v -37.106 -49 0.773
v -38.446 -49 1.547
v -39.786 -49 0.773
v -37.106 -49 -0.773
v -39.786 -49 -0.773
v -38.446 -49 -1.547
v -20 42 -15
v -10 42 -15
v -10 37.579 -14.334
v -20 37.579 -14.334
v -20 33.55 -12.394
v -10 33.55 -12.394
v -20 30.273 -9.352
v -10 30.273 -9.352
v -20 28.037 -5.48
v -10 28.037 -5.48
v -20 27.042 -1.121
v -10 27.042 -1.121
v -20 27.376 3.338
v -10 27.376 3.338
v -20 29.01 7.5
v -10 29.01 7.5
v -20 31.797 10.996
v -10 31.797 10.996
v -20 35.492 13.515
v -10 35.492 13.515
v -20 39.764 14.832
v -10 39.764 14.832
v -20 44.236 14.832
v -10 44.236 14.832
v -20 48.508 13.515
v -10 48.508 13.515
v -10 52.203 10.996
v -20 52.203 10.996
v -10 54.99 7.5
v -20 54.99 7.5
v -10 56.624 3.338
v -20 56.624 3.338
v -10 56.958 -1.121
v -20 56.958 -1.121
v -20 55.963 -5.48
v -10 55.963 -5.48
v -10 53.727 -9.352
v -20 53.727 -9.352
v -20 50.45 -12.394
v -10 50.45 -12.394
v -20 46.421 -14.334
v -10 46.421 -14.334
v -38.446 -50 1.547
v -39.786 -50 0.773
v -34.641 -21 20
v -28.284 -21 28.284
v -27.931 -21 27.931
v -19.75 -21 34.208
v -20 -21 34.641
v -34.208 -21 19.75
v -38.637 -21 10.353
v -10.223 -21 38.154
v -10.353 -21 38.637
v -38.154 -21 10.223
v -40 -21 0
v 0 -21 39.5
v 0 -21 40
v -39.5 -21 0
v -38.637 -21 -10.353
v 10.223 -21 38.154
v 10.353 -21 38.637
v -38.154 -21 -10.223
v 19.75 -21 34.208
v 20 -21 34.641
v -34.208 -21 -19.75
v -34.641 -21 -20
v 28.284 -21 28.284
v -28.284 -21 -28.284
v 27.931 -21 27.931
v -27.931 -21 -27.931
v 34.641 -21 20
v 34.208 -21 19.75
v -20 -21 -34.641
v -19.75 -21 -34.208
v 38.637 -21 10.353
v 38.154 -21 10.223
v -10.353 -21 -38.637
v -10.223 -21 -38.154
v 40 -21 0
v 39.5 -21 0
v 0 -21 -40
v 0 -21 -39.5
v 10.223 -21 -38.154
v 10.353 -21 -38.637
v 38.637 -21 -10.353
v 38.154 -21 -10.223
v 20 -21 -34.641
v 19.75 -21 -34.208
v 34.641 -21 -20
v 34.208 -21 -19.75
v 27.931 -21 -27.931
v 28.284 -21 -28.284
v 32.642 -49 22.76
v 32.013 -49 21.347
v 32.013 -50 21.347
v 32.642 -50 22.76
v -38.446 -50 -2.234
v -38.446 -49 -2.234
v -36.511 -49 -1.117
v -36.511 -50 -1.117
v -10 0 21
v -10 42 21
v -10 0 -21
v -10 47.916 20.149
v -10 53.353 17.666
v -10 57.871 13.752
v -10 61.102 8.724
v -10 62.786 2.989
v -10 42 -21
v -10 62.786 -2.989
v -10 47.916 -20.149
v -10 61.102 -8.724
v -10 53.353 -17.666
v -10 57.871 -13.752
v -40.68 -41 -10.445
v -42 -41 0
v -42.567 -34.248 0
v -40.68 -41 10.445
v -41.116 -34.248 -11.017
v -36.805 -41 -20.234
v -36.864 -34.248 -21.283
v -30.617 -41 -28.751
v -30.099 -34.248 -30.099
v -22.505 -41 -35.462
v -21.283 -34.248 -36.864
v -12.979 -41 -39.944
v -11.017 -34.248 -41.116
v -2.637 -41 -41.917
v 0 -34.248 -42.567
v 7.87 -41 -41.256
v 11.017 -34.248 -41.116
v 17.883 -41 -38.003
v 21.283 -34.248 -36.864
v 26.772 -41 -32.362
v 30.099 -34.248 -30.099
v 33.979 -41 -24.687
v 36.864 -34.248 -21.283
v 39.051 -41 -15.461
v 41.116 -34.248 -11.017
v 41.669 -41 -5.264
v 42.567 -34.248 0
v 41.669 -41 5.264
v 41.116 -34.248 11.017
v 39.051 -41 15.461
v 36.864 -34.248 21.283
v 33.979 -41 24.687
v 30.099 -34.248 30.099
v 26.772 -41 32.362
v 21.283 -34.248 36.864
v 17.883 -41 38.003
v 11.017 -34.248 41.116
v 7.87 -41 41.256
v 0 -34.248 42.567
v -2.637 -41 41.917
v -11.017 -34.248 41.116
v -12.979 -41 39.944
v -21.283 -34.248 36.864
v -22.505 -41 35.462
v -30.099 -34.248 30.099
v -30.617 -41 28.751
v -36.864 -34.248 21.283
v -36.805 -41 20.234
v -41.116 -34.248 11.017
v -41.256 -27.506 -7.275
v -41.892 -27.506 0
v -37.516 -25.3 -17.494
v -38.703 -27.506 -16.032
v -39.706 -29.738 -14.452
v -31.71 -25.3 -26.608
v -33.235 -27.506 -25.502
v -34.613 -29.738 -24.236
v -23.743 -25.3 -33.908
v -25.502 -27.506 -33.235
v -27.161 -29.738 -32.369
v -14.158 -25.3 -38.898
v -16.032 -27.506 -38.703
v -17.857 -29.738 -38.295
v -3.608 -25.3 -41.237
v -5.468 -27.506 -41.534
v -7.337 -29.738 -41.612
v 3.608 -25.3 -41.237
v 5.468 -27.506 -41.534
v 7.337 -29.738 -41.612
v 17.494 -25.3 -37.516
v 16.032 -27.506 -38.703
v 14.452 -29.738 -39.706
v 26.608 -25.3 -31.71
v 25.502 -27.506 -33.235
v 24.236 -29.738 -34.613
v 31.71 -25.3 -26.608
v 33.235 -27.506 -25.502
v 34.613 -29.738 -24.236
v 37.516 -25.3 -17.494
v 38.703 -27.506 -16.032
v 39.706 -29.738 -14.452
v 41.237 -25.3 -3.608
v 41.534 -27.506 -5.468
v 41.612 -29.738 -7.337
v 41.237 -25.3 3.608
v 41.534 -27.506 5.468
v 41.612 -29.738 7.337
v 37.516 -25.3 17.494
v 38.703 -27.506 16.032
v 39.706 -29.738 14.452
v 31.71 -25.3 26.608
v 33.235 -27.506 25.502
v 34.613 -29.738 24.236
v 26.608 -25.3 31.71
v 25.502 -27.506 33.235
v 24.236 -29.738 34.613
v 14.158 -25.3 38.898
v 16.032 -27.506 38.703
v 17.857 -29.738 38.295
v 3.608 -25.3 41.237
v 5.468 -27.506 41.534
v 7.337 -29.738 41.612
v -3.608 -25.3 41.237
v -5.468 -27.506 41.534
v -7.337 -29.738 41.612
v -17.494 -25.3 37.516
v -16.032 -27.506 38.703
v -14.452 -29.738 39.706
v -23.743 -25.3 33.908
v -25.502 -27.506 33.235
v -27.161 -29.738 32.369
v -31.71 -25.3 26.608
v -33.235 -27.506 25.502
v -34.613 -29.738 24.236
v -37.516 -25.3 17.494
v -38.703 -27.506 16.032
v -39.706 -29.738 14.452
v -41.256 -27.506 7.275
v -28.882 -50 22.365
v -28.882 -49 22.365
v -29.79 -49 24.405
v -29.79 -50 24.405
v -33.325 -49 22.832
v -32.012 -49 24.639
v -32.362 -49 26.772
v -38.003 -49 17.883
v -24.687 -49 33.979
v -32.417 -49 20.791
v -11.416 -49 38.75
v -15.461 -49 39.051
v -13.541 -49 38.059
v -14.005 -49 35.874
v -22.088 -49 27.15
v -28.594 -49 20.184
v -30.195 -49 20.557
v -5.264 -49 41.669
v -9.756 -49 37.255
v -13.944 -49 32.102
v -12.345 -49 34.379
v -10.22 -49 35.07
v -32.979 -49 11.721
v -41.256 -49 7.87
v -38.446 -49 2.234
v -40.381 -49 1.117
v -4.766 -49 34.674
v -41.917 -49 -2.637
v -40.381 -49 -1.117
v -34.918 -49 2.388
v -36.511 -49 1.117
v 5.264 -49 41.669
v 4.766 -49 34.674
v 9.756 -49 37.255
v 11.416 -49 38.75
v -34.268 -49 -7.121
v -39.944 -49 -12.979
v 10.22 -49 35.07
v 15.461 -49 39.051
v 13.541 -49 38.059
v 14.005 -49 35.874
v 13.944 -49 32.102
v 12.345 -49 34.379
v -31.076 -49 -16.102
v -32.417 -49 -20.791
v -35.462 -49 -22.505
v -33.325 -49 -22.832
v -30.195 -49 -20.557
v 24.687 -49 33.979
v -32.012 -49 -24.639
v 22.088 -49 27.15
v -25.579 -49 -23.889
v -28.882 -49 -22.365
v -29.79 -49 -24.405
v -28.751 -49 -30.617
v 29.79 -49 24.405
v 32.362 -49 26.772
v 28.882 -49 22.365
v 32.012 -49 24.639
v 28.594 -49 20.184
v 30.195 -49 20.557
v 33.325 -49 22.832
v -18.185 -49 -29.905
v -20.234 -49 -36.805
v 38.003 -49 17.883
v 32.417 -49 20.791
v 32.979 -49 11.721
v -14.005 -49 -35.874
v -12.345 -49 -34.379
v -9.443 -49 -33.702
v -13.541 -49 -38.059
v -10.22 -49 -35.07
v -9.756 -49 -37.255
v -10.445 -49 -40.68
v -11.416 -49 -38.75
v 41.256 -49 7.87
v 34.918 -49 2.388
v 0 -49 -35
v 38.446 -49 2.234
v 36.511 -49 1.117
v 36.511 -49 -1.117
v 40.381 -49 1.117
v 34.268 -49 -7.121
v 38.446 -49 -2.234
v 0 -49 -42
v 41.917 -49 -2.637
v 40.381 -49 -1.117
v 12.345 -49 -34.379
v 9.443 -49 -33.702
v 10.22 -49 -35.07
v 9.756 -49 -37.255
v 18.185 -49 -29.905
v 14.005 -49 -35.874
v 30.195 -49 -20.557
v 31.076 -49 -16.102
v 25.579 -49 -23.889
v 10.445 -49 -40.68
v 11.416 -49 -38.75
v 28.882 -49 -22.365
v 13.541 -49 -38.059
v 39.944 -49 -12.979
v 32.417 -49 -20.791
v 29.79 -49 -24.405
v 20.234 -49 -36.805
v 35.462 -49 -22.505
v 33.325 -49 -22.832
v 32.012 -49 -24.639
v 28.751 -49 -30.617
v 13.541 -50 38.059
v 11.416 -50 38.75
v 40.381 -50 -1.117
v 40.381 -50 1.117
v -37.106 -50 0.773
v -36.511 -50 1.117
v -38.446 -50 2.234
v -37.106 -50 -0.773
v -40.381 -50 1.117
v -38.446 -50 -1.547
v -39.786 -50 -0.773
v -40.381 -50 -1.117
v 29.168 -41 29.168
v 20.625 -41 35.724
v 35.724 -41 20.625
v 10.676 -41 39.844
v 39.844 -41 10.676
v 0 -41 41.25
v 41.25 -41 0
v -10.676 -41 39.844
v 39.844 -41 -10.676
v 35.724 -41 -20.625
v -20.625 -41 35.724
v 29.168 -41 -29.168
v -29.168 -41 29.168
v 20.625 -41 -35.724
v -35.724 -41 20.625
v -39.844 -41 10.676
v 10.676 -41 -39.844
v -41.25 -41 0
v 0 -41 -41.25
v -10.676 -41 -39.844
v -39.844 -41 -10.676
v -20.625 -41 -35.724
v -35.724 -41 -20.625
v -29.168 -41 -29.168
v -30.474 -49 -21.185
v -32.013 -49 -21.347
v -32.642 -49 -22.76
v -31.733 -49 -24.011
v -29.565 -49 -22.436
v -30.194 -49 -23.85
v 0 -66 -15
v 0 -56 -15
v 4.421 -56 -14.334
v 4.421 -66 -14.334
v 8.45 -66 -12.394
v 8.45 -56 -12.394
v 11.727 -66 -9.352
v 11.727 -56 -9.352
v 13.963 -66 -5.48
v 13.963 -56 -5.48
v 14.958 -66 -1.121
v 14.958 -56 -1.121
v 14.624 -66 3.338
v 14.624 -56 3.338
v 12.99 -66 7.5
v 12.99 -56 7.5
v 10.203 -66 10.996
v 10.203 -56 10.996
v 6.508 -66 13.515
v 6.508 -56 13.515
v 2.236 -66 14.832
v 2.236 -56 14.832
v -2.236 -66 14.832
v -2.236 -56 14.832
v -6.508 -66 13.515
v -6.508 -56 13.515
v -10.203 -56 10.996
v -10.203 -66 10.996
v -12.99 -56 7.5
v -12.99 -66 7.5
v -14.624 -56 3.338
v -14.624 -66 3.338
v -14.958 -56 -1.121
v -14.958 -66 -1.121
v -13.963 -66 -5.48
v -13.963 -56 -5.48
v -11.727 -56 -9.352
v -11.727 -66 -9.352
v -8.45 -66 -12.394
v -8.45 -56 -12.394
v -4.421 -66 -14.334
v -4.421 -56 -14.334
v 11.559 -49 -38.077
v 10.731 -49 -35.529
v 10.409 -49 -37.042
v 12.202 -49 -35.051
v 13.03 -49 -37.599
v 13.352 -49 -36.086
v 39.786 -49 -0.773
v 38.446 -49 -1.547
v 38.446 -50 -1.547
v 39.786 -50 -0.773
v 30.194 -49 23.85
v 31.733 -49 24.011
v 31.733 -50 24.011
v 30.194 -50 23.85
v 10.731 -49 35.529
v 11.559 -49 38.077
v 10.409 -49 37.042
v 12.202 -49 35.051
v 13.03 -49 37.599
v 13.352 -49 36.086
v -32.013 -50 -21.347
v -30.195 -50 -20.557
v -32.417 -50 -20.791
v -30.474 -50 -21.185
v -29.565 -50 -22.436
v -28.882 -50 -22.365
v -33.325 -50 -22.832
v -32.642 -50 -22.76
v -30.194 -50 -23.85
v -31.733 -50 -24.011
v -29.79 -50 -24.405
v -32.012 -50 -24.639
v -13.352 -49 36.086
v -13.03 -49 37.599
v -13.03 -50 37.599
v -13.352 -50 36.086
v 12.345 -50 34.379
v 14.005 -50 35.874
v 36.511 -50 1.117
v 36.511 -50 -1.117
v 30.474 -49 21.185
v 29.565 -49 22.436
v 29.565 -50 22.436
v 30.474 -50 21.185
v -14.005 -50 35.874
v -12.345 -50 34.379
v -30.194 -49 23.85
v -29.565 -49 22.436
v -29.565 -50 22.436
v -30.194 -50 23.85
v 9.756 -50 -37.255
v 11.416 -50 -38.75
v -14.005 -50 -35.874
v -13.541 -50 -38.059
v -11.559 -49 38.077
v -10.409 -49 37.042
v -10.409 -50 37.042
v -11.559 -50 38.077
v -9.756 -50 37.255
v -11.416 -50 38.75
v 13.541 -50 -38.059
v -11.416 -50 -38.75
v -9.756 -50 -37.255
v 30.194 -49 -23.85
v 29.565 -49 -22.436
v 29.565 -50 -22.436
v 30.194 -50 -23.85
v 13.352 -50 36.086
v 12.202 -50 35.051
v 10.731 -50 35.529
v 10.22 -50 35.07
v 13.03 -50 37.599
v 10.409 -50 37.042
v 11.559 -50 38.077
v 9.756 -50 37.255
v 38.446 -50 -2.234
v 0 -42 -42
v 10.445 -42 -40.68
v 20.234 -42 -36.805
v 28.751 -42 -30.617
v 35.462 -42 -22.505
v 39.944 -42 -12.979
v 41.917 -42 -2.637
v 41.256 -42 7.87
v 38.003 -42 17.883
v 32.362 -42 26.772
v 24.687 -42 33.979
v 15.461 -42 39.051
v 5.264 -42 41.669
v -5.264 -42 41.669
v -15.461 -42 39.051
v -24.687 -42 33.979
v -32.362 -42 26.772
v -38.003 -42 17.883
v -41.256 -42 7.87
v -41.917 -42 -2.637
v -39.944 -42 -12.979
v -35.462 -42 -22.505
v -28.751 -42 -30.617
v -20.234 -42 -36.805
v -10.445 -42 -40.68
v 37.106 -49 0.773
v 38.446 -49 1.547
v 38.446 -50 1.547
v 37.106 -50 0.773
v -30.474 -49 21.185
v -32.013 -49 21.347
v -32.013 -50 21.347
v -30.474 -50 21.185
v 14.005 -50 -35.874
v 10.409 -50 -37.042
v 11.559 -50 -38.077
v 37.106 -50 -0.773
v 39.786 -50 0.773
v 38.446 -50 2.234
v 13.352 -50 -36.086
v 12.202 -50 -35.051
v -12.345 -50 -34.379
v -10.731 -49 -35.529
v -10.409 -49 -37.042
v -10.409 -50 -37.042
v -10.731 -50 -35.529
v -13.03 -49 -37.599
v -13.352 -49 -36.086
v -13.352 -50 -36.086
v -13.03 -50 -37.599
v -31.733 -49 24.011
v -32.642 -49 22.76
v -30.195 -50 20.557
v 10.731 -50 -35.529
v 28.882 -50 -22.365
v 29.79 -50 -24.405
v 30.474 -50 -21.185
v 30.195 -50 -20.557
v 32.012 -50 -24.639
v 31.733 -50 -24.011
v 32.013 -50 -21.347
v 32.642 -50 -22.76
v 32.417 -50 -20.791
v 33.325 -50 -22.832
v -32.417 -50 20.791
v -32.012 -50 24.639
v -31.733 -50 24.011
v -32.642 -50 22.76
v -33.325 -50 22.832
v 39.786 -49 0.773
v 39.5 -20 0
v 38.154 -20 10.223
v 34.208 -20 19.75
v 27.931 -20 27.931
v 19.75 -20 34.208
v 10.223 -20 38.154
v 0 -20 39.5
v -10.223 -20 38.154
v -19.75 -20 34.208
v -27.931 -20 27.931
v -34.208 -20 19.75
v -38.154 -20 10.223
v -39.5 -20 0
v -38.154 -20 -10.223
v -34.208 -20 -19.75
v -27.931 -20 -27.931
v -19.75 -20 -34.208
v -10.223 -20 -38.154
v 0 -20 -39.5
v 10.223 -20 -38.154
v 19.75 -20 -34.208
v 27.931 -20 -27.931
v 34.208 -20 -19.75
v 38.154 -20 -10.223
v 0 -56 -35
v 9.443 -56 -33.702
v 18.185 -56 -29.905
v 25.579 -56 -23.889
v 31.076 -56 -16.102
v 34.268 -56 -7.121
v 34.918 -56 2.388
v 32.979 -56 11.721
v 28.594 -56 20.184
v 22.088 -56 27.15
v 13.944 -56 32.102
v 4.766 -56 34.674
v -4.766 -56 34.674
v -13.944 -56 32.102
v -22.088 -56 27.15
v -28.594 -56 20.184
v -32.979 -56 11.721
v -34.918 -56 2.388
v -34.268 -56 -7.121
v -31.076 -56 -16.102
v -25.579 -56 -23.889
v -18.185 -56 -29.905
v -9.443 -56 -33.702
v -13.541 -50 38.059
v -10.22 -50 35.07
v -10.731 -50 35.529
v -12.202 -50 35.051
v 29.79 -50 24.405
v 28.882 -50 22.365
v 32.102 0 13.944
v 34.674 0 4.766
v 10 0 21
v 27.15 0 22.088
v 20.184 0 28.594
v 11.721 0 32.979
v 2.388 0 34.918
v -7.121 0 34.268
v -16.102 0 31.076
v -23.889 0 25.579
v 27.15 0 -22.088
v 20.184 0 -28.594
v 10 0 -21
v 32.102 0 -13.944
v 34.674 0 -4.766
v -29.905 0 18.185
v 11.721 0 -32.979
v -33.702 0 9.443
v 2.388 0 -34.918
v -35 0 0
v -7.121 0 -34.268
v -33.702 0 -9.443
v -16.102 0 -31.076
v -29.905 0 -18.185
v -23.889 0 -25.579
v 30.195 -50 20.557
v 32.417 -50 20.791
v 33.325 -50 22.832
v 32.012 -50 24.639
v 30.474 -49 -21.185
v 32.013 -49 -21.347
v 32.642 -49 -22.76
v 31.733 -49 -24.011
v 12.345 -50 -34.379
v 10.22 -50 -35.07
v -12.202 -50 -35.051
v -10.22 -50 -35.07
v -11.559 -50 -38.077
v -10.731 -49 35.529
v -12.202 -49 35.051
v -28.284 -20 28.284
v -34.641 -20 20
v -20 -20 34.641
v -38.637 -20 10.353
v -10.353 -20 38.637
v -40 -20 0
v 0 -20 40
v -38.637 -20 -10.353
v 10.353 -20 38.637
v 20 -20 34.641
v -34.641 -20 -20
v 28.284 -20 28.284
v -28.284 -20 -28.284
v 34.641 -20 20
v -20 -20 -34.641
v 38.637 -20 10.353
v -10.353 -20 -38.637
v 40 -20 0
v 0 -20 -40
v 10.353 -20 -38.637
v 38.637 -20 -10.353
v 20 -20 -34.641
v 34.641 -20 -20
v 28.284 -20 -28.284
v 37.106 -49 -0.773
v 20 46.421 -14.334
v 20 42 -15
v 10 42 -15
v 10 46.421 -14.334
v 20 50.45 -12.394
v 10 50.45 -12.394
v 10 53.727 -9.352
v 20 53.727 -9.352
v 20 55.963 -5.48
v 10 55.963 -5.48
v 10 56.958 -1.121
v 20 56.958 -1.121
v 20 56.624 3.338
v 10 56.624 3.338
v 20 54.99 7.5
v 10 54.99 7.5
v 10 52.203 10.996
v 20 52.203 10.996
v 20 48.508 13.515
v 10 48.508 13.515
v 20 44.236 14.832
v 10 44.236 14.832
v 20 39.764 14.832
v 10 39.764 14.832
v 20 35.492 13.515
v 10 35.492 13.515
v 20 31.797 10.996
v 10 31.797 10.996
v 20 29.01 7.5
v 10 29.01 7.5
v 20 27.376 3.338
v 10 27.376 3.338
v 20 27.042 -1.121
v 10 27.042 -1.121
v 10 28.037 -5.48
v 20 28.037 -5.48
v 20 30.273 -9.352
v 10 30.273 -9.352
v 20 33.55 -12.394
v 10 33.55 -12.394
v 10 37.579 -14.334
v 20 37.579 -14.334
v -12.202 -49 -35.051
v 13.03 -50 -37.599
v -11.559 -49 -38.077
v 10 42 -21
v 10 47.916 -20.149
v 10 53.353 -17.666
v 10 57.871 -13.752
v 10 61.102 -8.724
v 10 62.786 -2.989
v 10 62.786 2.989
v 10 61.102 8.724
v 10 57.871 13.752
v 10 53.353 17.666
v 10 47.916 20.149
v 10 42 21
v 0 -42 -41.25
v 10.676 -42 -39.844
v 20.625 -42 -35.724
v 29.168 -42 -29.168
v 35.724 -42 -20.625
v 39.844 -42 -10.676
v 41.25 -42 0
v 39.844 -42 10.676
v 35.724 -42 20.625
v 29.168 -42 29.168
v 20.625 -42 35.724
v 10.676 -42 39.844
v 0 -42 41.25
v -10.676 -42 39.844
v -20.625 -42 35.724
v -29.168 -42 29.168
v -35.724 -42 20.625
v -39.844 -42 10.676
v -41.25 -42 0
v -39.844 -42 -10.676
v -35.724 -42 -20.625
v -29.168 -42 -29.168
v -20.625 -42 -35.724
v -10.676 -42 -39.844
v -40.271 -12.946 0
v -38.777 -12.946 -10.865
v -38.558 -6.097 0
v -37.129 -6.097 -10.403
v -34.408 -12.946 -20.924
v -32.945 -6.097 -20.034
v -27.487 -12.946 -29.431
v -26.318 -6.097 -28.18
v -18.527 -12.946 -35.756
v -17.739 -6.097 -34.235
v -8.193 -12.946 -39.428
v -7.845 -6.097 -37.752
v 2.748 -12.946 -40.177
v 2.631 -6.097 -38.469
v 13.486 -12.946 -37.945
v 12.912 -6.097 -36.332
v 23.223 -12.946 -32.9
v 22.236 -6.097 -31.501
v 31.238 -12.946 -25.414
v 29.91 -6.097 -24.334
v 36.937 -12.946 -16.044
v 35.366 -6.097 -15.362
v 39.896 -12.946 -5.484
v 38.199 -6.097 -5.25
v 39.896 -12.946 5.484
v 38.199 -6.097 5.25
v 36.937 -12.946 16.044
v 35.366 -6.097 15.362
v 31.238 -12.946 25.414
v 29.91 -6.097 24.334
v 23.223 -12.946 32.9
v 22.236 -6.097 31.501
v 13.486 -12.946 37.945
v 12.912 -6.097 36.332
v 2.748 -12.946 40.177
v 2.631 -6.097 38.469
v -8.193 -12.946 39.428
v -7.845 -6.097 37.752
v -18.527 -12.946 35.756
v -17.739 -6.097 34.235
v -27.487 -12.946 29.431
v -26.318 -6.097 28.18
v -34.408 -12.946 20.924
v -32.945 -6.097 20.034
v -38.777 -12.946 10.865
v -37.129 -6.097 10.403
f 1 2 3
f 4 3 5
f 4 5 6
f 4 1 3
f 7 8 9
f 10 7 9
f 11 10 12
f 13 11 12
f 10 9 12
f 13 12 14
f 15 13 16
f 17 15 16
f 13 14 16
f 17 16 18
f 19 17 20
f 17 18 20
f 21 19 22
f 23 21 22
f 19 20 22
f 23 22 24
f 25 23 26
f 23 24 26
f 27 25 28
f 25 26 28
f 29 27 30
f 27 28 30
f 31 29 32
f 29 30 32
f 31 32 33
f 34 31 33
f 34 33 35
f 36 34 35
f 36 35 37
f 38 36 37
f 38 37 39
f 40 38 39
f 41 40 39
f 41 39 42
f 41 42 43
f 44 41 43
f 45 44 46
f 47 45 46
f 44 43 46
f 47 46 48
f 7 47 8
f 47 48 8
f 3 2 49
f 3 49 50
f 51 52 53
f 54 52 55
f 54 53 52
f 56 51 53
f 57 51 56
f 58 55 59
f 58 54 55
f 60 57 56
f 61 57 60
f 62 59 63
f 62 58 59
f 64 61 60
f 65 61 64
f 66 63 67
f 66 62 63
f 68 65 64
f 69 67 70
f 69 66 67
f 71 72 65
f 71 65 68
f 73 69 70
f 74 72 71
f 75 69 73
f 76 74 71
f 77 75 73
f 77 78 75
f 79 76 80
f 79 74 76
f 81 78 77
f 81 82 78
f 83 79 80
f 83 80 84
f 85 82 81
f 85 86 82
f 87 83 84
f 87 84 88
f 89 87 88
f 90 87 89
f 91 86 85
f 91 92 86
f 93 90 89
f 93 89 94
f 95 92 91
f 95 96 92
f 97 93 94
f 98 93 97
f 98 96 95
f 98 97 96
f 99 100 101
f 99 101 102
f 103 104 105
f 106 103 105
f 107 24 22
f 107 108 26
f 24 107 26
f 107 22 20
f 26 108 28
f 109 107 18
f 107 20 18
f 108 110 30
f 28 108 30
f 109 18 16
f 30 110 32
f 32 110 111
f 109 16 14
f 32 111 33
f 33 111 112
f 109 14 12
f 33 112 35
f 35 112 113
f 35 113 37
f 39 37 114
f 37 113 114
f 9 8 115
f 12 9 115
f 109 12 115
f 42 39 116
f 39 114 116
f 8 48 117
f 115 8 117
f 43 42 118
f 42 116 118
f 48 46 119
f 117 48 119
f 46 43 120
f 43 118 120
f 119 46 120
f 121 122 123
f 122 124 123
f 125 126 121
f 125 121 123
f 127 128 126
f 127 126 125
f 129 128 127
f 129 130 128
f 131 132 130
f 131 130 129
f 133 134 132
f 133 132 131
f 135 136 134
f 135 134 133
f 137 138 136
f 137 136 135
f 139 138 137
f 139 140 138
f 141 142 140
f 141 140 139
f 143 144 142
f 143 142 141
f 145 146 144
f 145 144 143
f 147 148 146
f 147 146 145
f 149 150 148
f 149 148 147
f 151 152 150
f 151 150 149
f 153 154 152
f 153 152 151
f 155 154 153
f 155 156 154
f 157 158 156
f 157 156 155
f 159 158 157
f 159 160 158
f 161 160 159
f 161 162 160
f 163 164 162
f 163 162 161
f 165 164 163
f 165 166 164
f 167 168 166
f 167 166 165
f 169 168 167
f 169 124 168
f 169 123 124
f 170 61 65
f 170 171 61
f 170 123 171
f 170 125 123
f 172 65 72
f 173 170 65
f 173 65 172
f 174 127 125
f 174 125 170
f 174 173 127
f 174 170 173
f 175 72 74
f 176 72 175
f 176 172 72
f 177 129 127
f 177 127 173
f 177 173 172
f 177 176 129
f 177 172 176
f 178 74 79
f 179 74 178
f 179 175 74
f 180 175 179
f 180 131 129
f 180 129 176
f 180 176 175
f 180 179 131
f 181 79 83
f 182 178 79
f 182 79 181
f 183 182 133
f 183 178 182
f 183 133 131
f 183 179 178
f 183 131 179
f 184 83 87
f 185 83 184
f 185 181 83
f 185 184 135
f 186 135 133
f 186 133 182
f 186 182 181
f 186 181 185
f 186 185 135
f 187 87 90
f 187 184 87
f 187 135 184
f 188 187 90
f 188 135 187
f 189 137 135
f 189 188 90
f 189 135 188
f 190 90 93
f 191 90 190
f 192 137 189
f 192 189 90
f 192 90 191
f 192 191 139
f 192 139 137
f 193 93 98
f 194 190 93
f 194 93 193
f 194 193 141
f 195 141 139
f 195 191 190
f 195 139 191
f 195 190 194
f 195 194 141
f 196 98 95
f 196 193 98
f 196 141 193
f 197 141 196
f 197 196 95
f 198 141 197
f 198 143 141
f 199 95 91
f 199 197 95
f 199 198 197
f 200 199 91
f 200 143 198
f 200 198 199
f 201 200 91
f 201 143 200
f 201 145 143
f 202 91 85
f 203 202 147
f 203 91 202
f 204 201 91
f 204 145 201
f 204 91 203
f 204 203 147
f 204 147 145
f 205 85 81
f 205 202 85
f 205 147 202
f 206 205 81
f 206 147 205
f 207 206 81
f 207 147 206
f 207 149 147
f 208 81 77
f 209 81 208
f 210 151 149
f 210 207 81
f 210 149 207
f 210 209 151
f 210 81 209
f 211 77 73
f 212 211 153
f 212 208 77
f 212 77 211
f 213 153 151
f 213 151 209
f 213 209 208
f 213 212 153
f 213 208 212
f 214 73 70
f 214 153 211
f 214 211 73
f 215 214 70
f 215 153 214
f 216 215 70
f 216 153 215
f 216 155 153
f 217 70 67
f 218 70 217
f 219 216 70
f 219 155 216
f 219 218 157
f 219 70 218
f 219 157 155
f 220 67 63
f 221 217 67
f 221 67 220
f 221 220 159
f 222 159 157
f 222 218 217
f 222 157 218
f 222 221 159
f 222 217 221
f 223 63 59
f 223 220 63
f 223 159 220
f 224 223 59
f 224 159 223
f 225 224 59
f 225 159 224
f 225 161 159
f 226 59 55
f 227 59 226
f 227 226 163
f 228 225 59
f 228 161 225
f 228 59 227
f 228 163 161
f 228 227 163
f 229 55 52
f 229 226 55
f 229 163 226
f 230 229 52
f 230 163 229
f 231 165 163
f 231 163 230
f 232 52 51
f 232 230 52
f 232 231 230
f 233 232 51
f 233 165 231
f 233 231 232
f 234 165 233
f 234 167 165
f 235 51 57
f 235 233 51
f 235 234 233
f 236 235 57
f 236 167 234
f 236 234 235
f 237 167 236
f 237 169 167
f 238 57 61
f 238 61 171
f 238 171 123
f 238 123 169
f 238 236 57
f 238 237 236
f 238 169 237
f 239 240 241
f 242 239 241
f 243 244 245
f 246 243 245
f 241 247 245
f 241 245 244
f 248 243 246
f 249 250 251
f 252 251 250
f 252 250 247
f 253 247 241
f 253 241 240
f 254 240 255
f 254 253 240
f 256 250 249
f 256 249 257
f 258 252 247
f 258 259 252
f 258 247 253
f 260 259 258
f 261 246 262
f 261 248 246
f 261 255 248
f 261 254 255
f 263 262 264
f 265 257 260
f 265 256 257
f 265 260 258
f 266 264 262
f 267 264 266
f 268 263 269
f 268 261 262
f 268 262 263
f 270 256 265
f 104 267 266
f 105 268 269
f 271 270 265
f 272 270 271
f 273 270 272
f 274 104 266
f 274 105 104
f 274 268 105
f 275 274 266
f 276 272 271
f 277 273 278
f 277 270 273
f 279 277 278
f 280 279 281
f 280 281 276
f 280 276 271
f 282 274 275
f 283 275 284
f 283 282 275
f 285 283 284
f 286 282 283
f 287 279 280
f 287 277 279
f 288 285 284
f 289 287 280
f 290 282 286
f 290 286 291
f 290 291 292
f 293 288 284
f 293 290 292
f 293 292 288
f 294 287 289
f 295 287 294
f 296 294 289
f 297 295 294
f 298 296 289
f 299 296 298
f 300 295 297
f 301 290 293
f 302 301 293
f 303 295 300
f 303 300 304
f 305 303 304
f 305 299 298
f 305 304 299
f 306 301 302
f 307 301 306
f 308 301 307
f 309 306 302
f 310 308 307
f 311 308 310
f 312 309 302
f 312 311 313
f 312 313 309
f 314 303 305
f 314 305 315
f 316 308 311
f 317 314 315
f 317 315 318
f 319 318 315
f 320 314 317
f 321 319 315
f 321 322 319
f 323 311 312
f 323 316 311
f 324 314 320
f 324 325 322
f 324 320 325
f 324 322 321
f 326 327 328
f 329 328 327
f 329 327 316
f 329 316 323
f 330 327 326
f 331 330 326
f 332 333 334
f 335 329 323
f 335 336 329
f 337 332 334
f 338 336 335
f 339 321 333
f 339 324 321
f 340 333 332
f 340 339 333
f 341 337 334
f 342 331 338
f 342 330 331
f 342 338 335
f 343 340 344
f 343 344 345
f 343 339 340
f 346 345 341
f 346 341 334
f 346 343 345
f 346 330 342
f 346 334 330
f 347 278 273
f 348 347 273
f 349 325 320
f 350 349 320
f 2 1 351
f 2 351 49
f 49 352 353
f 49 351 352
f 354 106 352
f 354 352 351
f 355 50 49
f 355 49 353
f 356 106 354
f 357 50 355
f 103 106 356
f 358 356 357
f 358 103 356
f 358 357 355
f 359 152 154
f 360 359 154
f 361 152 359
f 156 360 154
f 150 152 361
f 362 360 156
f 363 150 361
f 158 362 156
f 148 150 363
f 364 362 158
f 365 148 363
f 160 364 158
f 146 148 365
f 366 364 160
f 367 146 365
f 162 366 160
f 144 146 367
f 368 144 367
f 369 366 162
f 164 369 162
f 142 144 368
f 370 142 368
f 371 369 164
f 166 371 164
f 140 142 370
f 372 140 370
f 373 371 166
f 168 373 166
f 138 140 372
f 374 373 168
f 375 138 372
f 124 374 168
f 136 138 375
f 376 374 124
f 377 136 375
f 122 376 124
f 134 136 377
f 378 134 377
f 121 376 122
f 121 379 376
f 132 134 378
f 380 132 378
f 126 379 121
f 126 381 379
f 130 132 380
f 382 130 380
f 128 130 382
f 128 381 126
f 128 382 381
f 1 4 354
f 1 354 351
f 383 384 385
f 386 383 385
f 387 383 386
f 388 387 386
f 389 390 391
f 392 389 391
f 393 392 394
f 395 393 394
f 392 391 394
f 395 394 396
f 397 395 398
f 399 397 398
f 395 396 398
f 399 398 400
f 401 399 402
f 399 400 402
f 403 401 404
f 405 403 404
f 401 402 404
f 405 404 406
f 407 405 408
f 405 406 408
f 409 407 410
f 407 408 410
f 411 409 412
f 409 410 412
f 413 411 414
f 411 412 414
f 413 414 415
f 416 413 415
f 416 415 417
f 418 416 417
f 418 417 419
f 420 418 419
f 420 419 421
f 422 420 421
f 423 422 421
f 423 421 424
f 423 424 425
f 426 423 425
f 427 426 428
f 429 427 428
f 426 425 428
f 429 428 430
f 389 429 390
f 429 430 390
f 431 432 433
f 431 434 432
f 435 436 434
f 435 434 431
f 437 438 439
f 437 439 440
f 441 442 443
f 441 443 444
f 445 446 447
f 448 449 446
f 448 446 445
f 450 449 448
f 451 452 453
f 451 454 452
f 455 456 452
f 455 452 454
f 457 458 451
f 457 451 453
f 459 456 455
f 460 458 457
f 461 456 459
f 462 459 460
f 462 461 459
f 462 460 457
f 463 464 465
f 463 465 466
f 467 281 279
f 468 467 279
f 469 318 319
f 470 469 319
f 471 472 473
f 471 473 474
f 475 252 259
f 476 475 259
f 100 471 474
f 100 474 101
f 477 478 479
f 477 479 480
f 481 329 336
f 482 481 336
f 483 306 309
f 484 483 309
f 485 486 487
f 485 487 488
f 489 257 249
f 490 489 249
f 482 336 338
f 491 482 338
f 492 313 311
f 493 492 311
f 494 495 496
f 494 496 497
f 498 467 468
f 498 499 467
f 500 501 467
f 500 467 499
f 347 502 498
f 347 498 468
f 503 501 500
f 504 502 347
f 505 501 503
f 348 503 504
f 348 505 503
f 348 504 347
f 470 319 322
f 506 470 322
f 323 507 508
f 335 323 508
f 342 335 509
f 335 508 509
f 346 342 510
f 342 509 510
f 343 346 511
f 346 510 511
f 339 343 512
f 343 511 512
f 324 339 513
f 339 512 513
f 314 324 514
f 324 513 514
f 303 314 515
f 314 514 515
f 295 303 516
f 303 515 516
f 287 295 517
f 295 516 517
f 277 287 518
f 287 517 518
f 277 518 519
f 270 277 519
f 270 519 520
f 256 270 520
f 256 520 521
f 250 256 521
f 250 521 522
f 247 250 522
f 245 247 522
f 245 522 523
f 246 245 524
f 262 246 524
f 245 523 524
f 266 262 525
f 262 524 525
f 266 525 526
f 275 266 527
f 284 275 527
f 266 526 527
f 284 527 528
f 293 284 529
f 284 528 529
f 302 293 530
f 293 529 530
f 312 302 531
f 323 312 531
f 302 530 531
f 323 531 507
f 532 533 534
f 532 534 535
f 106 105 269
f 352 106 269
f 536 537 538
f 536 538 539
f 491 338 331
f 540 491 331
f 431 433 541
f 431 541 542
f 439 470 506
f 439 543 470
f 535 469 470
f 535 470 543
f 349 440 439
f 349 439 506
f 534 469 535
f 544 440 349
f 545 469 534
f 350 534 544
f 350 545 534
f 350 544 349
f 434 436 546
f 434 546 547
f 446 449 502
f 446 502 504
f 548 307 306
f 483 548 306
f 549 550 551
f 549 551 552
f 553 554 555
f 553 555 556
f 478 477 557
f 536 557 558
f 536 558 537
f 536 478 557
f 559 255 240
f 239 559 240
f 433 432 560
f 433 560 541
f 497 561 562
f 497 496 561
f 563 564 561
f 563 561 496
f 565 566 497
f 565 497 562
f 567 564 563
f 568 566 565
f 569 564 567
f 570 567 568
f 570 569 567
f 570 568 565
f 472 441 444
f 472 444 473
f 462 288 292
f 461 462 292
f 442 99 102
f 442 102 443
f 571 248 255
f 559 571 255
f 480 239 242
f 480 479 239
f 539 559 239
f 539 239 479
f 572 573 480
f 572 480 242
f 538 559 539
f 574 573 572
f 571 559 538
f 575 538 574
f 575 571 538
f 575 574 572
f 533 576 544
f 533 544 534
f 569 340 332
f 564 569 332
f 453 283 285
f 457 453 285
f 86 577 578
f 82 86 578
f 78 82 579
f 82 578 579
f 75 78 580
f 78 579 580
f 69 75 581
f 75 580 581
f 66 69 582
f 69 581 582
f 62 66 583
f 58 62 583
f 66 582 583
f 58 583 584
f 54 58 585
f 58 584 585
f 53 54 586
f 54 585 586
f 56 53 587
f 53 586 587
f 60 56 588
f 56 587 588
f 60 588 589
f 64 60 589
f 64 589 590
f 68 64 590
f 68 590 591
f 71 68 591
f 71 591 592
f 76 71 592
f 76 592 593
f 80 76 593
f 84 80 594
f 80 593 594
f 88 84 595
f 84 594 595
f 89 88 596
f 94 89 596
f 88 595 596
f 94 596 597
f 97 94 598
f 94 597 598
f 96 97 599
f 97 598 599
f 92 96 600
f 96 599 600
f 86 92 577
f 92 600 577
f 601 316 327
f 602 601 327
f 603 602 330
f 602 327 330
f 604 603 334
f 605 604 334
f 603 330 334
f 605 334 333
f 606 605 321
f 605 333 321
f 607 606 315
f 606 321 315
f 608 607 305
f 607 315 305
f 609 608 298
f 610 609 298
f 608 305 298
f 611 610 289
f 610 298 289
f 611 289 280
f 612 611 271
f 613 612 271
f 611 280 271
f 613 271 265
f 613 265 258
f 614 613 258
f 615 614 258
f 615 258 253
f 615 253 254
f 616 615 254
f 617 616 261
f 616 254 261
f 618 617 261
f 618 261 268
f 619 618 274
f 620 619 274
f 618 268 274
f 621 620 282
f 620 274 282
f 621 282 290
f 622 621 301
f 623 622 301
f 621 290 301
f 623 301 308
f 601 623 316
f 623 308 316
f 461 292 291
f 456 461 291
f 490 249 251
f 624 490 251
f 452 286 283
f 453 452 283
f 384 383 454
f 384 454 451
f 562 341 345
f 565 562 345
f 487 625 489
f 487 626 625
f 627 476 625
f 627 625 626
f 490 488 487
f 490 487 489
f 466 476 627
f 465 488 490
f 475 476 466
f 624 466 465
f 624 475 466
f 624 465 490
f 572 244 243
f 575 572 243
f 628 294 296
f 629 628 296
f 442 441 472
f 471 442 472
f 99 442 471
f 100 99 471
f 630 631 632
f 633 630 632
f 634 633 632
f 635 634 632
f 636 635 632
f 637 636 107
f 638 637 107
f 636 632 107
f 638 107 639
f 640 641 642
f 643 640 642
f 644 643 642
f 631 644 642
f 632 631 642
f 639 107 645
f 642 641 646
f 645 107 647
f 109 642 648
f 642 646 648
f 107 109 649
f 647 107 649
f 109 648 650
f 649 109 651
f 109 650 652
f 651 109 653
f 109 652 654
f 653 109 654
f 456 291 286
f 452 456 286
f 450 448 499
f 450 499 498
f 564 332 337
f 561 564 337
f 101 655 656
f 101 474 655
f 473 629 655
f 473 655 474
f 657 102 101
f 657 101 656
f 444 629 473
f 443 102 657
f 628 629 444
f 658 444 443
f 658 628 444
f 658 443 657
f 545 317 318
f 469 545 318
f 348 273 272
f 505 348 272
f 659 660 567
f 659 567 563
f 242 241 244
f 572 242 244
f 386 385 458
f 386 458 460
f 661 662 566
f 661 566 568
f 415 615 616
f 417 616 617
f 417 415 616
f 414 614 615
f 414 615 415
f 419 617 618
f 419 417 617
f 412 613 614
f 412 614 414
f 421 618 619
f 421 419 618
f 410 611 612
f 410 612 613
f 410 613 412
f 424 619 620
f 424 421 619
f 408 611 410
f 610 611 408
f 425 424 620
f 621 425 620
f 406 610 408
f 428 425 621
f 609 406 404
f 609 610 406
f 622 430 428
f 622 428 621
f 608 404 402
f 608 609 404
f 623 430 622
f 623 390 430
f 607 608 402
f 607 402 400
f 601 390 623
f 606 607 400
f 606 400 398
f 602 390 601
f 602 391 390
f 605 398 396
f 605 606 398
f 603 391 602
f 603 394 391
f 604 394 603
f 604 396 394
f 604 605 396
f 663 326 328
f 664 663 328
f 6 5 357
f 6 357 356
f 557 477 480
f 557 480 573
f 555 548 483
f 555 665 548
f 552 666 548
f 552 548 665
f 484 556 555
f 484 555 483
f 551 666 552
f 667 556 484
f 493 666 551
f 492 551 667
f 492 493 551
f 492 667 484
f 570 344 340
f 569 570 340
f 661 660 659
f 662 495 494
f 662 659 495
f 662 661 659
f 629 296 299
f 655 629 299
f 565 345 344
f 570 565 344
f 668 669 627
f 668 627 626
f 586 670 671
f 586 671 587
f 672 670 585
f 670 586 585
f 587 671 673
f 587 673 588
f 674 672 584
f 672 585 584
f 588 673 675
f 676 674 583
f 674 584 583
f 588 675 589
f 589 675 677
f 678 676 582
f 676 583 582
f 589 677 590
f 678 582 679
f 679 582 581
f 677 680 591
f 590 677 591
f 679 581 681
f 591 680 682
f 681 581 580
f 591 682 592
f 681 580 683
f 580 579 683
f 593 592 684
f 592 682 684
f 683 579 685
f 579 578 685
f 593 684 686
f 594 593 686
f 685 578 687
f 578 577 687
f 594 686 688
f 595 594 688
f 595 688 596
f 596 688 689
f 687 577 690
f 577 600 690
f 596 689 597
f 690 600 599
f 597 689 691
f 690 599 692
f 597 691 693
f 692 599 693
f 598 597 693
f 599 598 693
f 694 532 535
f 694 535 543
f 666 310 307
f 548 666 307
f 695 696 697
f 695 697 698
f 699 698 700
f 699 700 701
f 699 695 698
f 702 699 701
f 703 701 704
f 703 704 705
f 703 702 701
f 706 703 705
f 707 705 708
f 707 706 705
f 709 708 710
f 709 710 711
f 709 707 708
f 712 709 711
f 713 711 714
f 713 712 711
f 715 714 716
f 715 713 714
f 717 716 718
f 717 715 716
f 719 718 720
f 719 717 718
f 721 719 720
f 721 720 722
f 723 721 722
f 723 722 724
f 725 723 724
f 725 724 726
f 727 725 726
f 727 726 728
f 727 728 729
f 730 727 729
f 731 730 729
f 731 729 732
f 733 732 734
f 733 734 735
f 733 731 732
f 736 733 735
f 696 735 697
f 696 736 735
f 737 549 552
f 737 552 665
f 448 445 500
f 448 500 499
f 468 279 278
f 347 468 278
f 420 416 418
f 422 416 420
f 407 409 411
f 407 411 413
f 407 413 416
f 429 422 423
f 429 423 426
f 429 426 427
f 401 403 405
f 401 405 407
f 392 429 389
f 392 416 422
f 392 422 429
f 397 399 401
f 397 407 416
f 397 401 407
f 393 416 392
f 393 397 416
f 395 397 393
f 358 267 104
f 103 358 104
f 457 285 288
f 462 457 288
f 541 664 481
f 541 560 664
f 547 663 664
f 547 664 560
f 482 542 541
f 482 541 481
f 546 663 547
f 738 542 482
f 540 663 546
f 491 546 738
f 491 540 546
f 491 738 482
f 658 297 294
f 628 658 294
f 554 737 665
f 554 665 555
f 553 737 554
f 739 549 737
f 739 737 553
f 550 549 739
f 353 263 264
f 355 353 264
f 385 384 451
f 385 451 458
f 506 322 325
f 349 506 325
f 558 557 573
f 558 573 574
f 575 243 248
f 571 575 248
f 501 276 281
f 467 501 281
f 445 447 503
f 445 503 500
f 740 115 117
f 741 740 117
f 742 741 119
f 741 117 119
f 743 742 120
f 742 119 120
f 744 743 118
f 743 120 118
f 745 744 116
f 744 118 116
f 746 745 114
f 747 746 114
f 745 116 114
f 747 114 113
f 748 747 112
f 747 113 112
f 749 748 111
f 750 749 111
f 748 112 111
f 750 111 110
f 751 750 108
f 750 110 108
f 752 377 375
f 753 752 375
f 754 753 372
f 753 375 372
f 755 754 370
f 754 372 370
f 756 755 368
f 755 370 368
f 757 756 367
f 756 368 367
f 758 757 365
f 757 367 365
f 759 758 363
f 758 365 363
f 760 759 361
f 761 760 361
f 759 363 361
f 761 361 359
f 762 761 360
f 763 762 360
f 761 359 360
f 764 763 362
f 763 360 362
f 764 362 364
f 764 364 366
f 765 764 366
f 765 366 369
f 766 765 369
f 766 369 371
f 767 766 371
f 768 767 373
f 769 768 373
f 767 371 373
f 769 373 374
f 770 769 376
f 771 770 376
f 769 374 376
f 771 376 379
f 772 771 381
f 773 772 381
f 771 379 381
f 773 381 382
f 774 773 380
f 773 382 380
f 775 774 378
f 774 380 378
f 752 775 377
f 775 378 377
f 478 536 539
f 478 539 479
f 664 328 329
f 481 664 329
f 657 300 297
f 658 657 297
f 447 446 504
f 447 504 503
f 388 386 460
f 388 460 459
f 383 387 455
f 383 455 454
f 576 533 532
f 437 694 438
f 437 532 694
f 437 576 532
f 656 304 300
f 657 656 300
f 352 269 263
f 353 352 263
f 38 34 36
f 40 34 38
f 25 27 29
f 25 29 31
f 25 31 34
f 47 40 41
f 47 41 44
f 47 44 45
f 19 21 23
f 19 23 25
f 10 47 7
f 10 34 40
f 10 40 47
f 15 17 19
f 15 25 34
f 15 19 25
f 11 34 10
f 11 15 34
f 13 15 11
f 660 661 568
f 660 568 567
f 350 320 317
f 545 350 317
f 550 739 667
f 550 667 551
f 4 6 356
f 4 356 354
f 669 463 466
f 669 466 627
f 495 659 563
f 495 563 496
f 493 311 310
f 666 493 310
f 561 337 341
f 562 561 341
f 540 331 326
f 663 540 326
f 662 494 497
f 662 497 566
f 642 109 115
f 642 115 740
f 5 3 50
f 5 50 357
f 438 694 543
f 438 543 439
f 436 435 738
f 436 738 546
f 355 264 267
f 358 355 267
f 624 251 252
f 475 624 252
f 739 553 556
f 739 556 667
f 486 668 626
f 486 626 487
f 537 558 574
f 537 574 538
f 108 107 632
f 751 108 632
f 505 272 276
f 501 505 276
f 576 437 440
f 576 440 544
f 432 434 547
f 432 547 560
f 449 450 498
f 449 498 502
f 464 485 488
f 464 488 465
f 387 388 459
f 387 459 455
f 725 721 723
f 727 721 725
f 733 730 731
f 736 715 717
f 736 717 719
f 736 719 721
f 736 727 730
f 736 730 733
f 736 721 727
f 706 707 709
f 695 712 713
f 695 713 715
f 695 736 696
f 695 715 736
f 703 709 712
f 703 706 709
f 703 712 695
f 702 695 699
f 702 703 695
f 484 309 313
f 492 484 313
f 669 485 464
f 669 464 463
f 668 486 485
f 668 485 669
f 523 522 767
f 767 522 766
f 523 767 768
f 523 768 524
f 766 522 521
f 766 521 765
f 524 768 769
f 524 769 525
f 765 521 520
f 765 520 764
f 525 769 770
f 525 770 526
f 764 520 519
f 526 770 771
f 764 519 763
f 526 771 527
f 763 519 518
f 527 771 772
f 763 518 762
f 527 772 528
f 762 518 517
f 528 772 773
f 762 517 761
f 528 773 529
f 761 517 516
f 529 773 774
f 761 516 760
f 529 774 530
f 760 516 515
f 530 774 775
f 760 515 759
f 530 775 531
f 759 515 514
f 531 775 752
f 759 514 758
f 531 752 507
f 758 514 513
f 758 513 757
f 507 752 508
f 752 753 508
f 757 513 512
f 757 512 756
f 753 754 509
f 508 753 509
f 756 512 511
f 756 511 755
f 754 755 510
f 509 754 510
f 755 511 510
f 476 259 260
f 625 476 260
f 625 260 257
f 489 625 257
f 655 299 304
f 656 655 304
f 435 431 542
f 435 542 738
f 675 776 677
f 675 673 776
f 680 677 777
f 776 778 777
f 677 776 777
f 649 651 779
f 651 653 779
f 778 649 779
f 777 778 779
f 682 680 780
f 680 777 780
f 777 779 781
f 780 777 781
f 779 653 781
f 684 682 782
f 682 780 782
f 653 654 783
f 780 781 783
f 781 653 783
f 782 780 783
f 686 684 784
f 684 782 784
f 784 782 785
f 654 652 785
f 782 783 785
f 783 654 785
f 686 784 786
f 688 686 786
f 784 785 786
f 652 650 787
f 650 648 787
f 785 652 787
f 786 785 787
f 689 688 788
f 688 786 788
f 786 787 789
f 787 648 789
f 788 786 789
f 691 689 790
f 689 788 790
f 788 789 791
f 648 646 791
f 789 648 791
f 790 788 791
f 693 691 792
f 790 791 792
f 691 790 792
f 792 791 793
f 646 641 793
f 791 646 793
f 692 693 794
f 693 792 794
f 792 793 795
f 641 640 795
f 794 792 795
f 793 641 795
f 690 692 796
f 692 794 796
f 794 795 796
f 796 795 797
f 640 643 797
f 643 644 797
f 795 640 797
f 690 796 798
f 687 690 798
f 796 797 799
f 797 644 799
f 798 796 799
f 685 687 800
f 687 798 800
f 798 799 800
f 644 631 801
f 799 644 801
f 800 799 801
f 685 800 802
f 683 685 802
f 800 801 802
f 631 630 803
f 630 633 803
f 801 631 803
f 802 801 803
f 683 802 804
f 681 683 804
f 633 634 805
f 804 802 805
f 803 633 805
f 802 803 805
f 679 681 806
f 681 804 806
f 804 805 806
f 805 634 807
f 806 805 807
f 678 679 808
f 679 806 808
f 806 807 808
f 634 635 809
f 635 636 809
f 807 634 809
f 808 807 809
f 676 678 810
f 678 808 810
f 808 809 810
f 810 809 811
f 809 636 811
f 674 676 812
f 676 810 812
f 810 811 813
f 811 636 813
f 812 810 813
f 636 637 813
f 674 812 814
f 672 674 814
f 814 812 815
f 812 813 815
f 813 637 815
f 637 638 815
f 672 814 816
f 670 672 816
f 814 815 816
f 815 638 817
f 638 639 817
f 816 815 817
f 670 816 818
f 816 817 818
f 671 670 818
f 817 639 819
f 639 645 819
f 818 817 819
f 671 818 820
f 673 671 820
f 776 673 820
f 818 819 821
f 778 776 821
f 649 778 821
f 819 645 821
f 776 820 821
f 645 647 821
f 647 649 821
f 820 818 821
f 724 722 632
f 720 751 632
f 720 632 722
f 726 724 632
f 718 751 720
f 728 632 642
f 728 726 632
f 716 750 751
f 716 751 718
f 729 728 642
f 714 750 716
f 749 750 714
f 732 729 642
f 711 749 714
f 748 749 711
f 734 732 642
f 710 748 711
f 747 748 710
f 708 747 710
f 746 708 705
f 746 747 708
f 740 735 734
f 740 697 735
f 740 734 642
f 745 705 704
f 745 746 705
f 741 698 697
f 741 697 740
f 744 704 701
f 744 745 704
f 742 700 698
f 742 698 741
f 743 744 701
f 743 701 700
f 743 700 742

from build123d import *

# Parameters (mm, degrees)
SKETCH2_R            = 39.5
BOSS_EXTRUDE1_DEPTH  = 1
SKETCH4_R            = 41.25
BOSS_EXTRUDE2_DEPTH  = 1
SKETCH5_R            = 42
BOSS_EXTRUDE3_DEPTH  = 7
SKETCH6_R            = 35
BOSS_EXTRUDE4_DEPTH  = 7
BOSS_EXTRUDE5_DEPTH  = 1
CIRPATTERN1_COUNT    = 10
SKETCH9_R            = 15
BOSS_EXTRUDE6_DEPTH  = 10
SKETCH10_W           = 20
SKETCH10_H           = 42
BOSS_EXTRUDE7_DEPTH  = 42
BOSS_EXTRUDE8_START  = -20
BOSS_EXTRUDE8_DEPTH  = 20
SKETCH12_R           = 15
BOSS_EXTRUDE9_DEPTH  = 10
BOSS_EXTRUDE10_START = 10
SKETCH13_R           = 15
BOSS_EXTRUDE10_DEPTH = 10


with BuildPart() as part:
    # Sketch1 → Revolve1 (revolve)
    with BuildSketch(Plane.XY):
        with BuildLine():
            Line((-35, 0), (0, 0))
            Line((0, 0), (0, -20))
            Line((0, -20), (-40, -20))
            ThreePointArc((-40, -20), (-39.657515479, -9.46062113), (-35, 0))
        make_face()
    revolve(axis=Axis((0, 0, 0), (0, -1, 0)))

    # Sketch2 → Boss-Extrude1 (add)
    with BuildSketch(Plane.XZ.offset(20)):
        Circle(SKETCH2_R)
    extrude(amount=BOSS_EXTRUDE1_DEPTH)

    # Sketch3 → Revolve2 (revolve)
    with BuildSketch(Plane(origin=(0, 0, 0), x_dir=(0, 0, -1), z_dir=(1, 0, 0)), mode=Mode.PRIVATE) as revolve2_sk:
        with BuildLine():
            Line((0, -21), (-40, -21))
            ThreePointArc((-40, -21), (-42.384109041, -30.861589096), (-42, -41))
            Line((-42, -41), (0, -41))
            Line((0, -41), (0, -21))
        make_face()
    revolve(revolve2_sk.sketch.rotate(Axis((0, -21, 0), (0, -1, 0)), 90), axis=Axis((0, -21, 0), (0, -1, 0)))

    # Sketch4 → Boss-Extrude2 (add)
    with BuildSketch(Plane.XZ.offset(41)):
        with Locations(Location((0, 0, 0), (0, 0, 270))):
            Circle(SKETCH4_R)
    extrude(amount=BOSS_EXTRUDE2_DEPTH)

    # Sketch5 → Boss-Extrude3 (add)
    with BuildSketch(Plane.XZ.offset(42)):
        with Locations(Location((0, 0, 0), (0, 0, 270))):
            Circle(SKETCH5_R)
    extrude(amount=BOSS_EXTRUDE3_DEPTH)

    # Sketch6 → Boss-Extrude4 (add)
    with BuildSketch(Plane.XZ.offset(49)):
        with Locations(Location((0, 0, 0), (0, 0, 270))):
            Circle(SKETCH6_R)
    extrude(amount=BOSS_EXTRUDE4_DEPTH)

    # Sketch7 → Boss-Extrude5 (add)
    with BuildSketch(Plane.XZ.offset(49)):
        Polygon((38.446071931, -2.233948034), (40.380727679, -1.116974017), (40.380727679, 1.116974017), (38.446071931, 2.233948034), (36.511416183, 1.116974017), (36.511416183, -1.116974017), align=None)
        Polygon((38.446071931, -1.546904417), (39.785730453, -0.773452208), (39.785730453, 0.773452208), (38.446071931, 1.546904417), (37.106413409, 0.773452208), (37.106413409, -0.773452208), align=None, mode=Mode.SUBTRACT)
    boss_extrude5 = extrude(amount=BOSS_EXTRUDE5_DEPTH)

    # CirPattern1: Boss-Extrude5 ×10 about axis
    cirpattern1_axis = Axis((0, 0, 0), (0, 1, 0))
    for i in range(1, CIRPATTERN1_COUNT):
        add(boss_extrude5.rotate(cirpattern1_axis, i * 360 / CIRPATTERN1_COUNT))

    # Sketch9 → Boss-Extrude6 (add)
    with BuildSketch(Plane.XZ.offset(56)):
        with Locations(Location((0, 0, 0), (0, 0, 270))):
            Circle(SKETCH9_R)
    extrude(amount=BOSS_EXTRUDE6_DEPTH)

    # Sketch10 → Boss-Extrude7 (add)
    with BuildSketch(Plane(origin=(0, 0, 0), x_dir=(1, 0, 0), z_dir=(0, 1, 0))):
        Rectangle(SKETCH10_W, SKETCH10_H)
    extrude(amount=BOSS_EXTRUDE7_DEPTH)

    # Sketch11 → Boss-Extrude8 (add)
    with BuildSketch(Plane(origin=(10, 0, 0), x_dir=(0, 0, -1), z_dir=(1, 0, 0)).offset(BOSS_EXTRUDE8_START)):
        with BuildLine():
            Line((-21, 42), (21, 42))
            ThreePointArc((21, 42), (0, 63), (-21, 42))
        make_face()
    extrude(amount=BOSS_EXTRUDE8_DEPTH)

    # Sketch12 → Boss-Extrude9 (add)
    with BuildSketch(Plane.ZY.offset(10)):
        with Locations(Location((0, 42, 0), (0, 0, 180))):
            Circle(SKETCH12_R)
    extrude(amount=BOSS_EXTRUDE9_DEPTH)

    # Sketch13 → Boss-Extrude10 (add)
    with BuildSketch(Plane(origin=(10, 0, 0), x_dir=(0, 0, -1), z_dir=(1, 0, 0)).offset(BOSS_EXTRUDE10_START)):
        with Locations((0, 42)):
            Circle(SKETCH13_R)
    extrude(amount=-BOSS_EXTRUDE10_DEPTH)


solid = part.part
